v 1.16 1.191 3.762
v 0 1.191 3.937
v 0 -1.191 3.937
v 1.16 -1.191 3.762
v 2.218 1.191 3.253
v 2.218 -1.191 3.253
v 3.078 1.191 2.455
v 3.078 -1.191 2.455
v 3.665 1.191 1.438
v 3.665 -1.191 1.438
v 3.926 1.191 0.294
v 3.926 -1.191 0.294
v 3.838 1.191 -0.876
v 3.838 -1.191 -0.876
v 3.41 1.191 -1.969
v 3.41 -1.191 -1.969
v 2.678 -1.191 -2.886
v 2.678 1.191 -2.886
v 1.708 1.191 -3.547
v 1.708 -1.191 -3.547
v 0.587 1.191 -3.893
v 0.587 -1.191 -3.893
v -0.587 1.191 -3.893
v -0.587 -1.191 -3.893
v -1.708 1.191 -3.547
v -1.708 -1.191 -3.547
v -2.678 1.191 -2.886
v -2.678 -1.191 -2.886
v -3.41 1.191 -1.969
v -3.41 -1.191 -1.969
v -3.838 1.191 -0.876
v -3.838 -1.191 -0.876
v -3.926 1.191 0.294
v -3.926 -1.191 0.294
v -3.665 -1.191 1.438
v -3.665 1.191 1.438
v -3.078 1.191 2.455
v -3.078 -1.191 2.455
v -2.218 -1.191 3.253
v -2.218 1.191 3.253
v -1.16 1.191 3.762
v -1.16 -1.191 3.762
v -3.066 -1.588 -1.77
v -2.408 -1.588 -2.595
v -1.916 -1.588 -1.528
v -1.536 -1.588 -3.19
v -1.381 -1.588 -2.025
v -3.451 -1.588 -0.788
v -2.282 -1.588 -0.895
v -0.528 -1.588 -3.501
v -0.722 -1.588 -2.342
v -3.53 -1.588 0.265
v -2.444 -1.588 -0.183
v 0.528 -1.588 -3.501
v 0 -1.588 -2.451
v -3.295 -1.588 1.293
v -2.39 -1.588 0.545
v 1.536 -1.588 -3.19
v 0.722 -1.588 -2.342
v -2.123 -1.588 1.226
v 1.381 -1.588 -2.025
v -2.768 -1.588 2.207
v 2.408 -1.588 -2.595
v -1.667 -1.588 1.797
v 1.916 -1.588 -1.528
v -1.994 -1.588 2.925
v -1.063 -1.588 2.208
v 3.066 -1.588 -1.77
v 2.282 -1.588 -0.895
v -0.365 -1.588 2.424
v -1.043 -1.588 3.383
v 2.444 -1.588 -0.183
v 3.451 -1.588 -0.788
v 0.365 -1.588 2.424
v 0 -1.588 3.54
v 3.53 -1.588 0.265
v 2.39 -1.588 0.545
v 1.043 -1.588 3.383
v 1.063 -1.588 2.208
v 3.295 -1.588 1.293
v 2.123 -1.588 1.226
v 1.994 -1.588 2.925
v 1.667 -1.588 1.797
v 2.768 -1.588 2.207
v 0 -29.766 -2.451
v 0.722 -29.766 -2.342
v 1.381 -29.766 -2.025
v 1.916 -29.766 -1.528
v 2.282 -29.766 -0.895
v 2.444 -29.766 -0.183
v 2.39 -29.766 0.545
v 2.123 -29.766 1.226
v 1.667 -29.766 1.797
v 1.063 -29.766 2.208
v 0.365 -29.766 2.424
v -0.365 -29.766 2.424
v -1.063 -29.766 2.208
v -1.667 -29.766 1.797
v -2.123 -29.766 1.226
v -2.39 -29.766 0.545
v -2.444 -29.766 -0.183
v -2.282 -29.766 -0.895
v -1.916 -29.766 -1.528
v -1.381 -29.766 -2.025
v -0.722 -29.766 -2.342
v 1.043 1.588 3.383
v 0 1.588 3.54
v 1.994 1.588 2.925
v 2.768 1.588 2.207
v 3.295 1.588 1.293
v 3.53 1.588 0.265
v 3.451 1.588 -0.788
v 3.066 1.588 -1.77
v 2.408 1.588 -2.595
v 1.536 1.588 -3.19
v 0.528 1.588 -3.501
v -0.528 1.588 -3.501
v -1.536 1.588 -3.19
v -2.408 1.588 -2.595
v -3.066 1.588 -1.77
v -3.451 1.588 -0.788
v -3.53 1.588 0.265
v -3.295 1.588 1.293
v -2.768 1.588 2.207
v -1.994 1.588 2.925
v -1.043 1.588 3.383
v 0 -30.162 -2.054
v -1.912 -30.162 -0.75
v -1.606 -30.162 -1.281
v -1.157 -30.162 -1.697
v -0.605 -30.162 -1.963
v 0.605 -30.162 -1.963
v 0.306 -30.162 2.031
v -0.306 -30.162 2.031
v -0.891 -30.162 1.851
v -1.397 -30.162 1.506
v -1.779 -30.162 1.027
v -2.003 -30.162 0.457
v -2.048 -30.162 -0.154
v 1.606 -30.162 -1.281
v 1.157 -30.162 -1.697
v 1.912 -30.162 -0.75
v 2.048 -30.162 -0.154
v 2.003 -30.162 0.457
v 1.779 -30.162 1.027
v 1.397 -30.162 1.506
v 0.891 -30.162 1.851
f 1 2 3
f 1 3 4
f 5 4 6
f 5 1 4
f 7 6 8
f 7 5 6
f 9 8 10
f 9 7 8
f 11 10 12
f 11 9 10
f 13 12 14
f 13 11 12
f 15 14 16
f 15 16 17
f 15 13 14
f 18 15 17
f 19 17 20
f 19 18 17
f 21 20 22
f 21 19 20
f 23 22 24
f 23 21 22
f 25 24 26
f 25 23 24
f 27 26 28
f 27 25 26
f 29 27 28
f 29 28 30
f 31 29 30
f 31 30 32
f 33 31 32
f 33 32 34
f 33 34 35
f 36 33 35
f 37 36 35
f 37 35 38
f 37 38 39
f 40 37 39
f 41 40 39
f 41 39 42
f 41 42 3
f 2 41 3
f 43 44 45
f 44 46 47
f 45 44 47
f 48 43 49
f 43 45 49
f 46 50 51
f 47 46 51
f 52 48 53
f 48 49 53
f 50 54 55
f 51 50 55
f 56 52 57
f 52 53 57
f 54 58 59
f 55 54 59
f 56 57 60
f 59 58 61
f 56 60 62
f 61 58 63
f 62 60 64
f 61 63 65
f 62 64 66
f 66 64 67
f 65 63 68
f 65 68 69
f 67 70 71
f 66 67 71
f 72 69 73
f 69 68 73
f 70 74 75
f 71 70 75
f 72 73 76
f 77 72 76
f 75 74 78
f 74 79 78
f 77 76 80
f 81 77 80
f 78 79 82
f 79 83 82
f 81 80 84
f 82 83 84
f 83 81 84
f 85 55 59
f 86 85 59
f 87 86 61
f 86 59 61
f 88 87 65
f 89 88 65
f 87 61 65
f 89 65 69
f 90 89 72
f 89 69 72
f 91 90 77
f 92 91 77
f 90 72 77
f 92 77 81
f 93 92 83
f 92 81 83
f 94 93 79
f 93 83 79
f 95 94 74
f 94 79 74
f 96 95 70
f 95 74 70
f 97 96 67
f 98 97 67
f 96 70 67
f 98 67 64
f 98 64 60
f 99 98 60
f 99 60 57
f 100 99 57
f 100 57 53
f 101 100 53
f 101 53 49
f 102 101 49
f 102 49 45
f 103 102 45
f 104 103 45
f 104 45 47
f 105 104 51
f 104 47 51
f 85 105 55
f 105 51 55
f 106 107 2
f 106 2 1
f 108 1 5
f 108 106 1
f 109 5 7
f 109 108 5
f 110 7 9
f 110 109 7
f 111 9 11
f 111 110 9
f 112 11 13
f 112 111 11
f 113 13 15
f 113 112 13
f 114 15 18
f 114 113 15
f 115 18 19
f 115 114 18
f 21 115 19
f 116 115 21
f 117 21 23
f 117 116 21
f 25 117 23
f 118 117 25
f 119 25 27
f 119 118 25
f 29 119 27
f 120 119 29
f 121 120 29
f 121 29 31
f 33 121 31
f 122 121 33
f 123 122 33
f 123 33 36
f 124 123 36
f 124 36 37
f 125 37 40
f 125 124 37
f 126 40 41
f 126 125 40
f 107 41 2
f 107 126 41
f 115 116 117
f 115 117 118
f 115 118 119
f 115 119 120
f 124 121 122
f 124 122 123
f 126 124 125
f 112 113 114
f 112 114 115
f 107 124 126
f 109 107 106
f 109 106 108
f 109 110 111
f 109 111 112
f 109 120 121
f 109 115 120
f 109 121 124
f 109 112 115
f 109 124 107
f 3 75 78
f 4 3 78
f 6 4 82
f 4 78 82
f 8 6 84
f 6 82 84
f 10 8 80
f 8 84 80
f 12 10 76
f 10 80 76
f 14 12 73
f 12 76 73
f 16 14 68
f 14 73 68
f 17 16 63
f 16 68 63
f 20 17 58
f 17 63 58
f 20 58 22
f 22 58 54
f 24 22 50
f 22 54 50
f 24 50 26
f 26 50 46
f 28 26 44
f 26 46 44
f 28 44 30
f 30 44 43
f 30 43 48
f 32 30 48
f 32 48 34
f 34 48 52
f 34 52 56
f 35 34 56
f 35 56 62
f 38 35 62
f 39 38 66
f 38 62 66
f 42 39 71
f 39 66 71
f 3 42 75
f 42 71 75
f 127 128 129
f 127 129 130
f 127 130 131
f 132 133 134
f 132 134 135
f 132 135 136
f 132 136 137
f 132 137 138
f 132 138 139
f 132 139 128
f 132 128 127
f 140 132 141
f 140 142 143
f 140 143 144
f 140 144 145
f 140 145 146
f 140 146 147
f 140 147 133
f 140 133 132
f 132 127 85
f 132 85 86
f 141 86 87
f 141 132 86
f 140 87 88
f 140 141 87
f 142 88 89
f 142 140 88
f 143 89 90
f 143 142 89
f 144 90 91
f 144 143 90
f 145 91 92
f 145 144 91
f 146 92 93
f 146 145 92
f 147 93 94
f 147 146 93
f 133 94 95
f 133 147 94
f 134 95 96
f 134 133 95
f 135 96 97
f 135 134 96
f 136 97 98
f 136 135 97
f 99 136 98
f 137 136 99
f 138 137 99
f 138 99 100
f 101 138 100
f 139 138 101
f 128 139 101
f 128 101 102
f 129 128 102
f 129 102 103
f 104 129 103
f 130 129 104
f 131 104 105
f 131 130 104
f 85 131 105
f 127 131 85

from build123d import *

# Parameters (mm, degrees)
SKETCH1_R           = 3.937
BOSS_EXTRUDE1_DEPTH = 1.5875
SKETCH2_R           = 2.4511
BOSS_EXTRUDE2_DEPTH = 28.575
CHAMFER1_SIZE       = 0.396875


with BuildPart() as part:
    # Sketch1 → Boss-Extrude1 (new, symmetric)
    with BuildSketch(Plane(origin=(0, 0, 0), x_dir=(1, 0, 0), z_dir=(0, 1, 0))):
        with Locations(Location((0, 0, 0), (0, 0, 270))):
            Circle(SKETCH1_R)
    extrude(amount=BOSS_EXTRUDE1_DEPTH, both=True)

    # Sketch2 → Boss-Extrude2 (add)
    with BuildSketch(Plane.XZ.offset(1.5875)):
        with Locations(Location((0, 0, 0), (0, 0, 270))):
            Circle(SKETCH2_R)
    extrude(amount=BOSS_EXTRUDE2_DEPTH)

    # Chamfer1
    chamfer1_edges = [part.edges().sort_by_distance(p)[0] for p in [
        (0, -1.5875, -3.937),
        (0, 1.5875, -3.937),
        (0, -30.1625, 2.4511),
    ]]
    chamfer(chamfer1_edges, length=CHAMFER1_SIZE)


solid = part.part
